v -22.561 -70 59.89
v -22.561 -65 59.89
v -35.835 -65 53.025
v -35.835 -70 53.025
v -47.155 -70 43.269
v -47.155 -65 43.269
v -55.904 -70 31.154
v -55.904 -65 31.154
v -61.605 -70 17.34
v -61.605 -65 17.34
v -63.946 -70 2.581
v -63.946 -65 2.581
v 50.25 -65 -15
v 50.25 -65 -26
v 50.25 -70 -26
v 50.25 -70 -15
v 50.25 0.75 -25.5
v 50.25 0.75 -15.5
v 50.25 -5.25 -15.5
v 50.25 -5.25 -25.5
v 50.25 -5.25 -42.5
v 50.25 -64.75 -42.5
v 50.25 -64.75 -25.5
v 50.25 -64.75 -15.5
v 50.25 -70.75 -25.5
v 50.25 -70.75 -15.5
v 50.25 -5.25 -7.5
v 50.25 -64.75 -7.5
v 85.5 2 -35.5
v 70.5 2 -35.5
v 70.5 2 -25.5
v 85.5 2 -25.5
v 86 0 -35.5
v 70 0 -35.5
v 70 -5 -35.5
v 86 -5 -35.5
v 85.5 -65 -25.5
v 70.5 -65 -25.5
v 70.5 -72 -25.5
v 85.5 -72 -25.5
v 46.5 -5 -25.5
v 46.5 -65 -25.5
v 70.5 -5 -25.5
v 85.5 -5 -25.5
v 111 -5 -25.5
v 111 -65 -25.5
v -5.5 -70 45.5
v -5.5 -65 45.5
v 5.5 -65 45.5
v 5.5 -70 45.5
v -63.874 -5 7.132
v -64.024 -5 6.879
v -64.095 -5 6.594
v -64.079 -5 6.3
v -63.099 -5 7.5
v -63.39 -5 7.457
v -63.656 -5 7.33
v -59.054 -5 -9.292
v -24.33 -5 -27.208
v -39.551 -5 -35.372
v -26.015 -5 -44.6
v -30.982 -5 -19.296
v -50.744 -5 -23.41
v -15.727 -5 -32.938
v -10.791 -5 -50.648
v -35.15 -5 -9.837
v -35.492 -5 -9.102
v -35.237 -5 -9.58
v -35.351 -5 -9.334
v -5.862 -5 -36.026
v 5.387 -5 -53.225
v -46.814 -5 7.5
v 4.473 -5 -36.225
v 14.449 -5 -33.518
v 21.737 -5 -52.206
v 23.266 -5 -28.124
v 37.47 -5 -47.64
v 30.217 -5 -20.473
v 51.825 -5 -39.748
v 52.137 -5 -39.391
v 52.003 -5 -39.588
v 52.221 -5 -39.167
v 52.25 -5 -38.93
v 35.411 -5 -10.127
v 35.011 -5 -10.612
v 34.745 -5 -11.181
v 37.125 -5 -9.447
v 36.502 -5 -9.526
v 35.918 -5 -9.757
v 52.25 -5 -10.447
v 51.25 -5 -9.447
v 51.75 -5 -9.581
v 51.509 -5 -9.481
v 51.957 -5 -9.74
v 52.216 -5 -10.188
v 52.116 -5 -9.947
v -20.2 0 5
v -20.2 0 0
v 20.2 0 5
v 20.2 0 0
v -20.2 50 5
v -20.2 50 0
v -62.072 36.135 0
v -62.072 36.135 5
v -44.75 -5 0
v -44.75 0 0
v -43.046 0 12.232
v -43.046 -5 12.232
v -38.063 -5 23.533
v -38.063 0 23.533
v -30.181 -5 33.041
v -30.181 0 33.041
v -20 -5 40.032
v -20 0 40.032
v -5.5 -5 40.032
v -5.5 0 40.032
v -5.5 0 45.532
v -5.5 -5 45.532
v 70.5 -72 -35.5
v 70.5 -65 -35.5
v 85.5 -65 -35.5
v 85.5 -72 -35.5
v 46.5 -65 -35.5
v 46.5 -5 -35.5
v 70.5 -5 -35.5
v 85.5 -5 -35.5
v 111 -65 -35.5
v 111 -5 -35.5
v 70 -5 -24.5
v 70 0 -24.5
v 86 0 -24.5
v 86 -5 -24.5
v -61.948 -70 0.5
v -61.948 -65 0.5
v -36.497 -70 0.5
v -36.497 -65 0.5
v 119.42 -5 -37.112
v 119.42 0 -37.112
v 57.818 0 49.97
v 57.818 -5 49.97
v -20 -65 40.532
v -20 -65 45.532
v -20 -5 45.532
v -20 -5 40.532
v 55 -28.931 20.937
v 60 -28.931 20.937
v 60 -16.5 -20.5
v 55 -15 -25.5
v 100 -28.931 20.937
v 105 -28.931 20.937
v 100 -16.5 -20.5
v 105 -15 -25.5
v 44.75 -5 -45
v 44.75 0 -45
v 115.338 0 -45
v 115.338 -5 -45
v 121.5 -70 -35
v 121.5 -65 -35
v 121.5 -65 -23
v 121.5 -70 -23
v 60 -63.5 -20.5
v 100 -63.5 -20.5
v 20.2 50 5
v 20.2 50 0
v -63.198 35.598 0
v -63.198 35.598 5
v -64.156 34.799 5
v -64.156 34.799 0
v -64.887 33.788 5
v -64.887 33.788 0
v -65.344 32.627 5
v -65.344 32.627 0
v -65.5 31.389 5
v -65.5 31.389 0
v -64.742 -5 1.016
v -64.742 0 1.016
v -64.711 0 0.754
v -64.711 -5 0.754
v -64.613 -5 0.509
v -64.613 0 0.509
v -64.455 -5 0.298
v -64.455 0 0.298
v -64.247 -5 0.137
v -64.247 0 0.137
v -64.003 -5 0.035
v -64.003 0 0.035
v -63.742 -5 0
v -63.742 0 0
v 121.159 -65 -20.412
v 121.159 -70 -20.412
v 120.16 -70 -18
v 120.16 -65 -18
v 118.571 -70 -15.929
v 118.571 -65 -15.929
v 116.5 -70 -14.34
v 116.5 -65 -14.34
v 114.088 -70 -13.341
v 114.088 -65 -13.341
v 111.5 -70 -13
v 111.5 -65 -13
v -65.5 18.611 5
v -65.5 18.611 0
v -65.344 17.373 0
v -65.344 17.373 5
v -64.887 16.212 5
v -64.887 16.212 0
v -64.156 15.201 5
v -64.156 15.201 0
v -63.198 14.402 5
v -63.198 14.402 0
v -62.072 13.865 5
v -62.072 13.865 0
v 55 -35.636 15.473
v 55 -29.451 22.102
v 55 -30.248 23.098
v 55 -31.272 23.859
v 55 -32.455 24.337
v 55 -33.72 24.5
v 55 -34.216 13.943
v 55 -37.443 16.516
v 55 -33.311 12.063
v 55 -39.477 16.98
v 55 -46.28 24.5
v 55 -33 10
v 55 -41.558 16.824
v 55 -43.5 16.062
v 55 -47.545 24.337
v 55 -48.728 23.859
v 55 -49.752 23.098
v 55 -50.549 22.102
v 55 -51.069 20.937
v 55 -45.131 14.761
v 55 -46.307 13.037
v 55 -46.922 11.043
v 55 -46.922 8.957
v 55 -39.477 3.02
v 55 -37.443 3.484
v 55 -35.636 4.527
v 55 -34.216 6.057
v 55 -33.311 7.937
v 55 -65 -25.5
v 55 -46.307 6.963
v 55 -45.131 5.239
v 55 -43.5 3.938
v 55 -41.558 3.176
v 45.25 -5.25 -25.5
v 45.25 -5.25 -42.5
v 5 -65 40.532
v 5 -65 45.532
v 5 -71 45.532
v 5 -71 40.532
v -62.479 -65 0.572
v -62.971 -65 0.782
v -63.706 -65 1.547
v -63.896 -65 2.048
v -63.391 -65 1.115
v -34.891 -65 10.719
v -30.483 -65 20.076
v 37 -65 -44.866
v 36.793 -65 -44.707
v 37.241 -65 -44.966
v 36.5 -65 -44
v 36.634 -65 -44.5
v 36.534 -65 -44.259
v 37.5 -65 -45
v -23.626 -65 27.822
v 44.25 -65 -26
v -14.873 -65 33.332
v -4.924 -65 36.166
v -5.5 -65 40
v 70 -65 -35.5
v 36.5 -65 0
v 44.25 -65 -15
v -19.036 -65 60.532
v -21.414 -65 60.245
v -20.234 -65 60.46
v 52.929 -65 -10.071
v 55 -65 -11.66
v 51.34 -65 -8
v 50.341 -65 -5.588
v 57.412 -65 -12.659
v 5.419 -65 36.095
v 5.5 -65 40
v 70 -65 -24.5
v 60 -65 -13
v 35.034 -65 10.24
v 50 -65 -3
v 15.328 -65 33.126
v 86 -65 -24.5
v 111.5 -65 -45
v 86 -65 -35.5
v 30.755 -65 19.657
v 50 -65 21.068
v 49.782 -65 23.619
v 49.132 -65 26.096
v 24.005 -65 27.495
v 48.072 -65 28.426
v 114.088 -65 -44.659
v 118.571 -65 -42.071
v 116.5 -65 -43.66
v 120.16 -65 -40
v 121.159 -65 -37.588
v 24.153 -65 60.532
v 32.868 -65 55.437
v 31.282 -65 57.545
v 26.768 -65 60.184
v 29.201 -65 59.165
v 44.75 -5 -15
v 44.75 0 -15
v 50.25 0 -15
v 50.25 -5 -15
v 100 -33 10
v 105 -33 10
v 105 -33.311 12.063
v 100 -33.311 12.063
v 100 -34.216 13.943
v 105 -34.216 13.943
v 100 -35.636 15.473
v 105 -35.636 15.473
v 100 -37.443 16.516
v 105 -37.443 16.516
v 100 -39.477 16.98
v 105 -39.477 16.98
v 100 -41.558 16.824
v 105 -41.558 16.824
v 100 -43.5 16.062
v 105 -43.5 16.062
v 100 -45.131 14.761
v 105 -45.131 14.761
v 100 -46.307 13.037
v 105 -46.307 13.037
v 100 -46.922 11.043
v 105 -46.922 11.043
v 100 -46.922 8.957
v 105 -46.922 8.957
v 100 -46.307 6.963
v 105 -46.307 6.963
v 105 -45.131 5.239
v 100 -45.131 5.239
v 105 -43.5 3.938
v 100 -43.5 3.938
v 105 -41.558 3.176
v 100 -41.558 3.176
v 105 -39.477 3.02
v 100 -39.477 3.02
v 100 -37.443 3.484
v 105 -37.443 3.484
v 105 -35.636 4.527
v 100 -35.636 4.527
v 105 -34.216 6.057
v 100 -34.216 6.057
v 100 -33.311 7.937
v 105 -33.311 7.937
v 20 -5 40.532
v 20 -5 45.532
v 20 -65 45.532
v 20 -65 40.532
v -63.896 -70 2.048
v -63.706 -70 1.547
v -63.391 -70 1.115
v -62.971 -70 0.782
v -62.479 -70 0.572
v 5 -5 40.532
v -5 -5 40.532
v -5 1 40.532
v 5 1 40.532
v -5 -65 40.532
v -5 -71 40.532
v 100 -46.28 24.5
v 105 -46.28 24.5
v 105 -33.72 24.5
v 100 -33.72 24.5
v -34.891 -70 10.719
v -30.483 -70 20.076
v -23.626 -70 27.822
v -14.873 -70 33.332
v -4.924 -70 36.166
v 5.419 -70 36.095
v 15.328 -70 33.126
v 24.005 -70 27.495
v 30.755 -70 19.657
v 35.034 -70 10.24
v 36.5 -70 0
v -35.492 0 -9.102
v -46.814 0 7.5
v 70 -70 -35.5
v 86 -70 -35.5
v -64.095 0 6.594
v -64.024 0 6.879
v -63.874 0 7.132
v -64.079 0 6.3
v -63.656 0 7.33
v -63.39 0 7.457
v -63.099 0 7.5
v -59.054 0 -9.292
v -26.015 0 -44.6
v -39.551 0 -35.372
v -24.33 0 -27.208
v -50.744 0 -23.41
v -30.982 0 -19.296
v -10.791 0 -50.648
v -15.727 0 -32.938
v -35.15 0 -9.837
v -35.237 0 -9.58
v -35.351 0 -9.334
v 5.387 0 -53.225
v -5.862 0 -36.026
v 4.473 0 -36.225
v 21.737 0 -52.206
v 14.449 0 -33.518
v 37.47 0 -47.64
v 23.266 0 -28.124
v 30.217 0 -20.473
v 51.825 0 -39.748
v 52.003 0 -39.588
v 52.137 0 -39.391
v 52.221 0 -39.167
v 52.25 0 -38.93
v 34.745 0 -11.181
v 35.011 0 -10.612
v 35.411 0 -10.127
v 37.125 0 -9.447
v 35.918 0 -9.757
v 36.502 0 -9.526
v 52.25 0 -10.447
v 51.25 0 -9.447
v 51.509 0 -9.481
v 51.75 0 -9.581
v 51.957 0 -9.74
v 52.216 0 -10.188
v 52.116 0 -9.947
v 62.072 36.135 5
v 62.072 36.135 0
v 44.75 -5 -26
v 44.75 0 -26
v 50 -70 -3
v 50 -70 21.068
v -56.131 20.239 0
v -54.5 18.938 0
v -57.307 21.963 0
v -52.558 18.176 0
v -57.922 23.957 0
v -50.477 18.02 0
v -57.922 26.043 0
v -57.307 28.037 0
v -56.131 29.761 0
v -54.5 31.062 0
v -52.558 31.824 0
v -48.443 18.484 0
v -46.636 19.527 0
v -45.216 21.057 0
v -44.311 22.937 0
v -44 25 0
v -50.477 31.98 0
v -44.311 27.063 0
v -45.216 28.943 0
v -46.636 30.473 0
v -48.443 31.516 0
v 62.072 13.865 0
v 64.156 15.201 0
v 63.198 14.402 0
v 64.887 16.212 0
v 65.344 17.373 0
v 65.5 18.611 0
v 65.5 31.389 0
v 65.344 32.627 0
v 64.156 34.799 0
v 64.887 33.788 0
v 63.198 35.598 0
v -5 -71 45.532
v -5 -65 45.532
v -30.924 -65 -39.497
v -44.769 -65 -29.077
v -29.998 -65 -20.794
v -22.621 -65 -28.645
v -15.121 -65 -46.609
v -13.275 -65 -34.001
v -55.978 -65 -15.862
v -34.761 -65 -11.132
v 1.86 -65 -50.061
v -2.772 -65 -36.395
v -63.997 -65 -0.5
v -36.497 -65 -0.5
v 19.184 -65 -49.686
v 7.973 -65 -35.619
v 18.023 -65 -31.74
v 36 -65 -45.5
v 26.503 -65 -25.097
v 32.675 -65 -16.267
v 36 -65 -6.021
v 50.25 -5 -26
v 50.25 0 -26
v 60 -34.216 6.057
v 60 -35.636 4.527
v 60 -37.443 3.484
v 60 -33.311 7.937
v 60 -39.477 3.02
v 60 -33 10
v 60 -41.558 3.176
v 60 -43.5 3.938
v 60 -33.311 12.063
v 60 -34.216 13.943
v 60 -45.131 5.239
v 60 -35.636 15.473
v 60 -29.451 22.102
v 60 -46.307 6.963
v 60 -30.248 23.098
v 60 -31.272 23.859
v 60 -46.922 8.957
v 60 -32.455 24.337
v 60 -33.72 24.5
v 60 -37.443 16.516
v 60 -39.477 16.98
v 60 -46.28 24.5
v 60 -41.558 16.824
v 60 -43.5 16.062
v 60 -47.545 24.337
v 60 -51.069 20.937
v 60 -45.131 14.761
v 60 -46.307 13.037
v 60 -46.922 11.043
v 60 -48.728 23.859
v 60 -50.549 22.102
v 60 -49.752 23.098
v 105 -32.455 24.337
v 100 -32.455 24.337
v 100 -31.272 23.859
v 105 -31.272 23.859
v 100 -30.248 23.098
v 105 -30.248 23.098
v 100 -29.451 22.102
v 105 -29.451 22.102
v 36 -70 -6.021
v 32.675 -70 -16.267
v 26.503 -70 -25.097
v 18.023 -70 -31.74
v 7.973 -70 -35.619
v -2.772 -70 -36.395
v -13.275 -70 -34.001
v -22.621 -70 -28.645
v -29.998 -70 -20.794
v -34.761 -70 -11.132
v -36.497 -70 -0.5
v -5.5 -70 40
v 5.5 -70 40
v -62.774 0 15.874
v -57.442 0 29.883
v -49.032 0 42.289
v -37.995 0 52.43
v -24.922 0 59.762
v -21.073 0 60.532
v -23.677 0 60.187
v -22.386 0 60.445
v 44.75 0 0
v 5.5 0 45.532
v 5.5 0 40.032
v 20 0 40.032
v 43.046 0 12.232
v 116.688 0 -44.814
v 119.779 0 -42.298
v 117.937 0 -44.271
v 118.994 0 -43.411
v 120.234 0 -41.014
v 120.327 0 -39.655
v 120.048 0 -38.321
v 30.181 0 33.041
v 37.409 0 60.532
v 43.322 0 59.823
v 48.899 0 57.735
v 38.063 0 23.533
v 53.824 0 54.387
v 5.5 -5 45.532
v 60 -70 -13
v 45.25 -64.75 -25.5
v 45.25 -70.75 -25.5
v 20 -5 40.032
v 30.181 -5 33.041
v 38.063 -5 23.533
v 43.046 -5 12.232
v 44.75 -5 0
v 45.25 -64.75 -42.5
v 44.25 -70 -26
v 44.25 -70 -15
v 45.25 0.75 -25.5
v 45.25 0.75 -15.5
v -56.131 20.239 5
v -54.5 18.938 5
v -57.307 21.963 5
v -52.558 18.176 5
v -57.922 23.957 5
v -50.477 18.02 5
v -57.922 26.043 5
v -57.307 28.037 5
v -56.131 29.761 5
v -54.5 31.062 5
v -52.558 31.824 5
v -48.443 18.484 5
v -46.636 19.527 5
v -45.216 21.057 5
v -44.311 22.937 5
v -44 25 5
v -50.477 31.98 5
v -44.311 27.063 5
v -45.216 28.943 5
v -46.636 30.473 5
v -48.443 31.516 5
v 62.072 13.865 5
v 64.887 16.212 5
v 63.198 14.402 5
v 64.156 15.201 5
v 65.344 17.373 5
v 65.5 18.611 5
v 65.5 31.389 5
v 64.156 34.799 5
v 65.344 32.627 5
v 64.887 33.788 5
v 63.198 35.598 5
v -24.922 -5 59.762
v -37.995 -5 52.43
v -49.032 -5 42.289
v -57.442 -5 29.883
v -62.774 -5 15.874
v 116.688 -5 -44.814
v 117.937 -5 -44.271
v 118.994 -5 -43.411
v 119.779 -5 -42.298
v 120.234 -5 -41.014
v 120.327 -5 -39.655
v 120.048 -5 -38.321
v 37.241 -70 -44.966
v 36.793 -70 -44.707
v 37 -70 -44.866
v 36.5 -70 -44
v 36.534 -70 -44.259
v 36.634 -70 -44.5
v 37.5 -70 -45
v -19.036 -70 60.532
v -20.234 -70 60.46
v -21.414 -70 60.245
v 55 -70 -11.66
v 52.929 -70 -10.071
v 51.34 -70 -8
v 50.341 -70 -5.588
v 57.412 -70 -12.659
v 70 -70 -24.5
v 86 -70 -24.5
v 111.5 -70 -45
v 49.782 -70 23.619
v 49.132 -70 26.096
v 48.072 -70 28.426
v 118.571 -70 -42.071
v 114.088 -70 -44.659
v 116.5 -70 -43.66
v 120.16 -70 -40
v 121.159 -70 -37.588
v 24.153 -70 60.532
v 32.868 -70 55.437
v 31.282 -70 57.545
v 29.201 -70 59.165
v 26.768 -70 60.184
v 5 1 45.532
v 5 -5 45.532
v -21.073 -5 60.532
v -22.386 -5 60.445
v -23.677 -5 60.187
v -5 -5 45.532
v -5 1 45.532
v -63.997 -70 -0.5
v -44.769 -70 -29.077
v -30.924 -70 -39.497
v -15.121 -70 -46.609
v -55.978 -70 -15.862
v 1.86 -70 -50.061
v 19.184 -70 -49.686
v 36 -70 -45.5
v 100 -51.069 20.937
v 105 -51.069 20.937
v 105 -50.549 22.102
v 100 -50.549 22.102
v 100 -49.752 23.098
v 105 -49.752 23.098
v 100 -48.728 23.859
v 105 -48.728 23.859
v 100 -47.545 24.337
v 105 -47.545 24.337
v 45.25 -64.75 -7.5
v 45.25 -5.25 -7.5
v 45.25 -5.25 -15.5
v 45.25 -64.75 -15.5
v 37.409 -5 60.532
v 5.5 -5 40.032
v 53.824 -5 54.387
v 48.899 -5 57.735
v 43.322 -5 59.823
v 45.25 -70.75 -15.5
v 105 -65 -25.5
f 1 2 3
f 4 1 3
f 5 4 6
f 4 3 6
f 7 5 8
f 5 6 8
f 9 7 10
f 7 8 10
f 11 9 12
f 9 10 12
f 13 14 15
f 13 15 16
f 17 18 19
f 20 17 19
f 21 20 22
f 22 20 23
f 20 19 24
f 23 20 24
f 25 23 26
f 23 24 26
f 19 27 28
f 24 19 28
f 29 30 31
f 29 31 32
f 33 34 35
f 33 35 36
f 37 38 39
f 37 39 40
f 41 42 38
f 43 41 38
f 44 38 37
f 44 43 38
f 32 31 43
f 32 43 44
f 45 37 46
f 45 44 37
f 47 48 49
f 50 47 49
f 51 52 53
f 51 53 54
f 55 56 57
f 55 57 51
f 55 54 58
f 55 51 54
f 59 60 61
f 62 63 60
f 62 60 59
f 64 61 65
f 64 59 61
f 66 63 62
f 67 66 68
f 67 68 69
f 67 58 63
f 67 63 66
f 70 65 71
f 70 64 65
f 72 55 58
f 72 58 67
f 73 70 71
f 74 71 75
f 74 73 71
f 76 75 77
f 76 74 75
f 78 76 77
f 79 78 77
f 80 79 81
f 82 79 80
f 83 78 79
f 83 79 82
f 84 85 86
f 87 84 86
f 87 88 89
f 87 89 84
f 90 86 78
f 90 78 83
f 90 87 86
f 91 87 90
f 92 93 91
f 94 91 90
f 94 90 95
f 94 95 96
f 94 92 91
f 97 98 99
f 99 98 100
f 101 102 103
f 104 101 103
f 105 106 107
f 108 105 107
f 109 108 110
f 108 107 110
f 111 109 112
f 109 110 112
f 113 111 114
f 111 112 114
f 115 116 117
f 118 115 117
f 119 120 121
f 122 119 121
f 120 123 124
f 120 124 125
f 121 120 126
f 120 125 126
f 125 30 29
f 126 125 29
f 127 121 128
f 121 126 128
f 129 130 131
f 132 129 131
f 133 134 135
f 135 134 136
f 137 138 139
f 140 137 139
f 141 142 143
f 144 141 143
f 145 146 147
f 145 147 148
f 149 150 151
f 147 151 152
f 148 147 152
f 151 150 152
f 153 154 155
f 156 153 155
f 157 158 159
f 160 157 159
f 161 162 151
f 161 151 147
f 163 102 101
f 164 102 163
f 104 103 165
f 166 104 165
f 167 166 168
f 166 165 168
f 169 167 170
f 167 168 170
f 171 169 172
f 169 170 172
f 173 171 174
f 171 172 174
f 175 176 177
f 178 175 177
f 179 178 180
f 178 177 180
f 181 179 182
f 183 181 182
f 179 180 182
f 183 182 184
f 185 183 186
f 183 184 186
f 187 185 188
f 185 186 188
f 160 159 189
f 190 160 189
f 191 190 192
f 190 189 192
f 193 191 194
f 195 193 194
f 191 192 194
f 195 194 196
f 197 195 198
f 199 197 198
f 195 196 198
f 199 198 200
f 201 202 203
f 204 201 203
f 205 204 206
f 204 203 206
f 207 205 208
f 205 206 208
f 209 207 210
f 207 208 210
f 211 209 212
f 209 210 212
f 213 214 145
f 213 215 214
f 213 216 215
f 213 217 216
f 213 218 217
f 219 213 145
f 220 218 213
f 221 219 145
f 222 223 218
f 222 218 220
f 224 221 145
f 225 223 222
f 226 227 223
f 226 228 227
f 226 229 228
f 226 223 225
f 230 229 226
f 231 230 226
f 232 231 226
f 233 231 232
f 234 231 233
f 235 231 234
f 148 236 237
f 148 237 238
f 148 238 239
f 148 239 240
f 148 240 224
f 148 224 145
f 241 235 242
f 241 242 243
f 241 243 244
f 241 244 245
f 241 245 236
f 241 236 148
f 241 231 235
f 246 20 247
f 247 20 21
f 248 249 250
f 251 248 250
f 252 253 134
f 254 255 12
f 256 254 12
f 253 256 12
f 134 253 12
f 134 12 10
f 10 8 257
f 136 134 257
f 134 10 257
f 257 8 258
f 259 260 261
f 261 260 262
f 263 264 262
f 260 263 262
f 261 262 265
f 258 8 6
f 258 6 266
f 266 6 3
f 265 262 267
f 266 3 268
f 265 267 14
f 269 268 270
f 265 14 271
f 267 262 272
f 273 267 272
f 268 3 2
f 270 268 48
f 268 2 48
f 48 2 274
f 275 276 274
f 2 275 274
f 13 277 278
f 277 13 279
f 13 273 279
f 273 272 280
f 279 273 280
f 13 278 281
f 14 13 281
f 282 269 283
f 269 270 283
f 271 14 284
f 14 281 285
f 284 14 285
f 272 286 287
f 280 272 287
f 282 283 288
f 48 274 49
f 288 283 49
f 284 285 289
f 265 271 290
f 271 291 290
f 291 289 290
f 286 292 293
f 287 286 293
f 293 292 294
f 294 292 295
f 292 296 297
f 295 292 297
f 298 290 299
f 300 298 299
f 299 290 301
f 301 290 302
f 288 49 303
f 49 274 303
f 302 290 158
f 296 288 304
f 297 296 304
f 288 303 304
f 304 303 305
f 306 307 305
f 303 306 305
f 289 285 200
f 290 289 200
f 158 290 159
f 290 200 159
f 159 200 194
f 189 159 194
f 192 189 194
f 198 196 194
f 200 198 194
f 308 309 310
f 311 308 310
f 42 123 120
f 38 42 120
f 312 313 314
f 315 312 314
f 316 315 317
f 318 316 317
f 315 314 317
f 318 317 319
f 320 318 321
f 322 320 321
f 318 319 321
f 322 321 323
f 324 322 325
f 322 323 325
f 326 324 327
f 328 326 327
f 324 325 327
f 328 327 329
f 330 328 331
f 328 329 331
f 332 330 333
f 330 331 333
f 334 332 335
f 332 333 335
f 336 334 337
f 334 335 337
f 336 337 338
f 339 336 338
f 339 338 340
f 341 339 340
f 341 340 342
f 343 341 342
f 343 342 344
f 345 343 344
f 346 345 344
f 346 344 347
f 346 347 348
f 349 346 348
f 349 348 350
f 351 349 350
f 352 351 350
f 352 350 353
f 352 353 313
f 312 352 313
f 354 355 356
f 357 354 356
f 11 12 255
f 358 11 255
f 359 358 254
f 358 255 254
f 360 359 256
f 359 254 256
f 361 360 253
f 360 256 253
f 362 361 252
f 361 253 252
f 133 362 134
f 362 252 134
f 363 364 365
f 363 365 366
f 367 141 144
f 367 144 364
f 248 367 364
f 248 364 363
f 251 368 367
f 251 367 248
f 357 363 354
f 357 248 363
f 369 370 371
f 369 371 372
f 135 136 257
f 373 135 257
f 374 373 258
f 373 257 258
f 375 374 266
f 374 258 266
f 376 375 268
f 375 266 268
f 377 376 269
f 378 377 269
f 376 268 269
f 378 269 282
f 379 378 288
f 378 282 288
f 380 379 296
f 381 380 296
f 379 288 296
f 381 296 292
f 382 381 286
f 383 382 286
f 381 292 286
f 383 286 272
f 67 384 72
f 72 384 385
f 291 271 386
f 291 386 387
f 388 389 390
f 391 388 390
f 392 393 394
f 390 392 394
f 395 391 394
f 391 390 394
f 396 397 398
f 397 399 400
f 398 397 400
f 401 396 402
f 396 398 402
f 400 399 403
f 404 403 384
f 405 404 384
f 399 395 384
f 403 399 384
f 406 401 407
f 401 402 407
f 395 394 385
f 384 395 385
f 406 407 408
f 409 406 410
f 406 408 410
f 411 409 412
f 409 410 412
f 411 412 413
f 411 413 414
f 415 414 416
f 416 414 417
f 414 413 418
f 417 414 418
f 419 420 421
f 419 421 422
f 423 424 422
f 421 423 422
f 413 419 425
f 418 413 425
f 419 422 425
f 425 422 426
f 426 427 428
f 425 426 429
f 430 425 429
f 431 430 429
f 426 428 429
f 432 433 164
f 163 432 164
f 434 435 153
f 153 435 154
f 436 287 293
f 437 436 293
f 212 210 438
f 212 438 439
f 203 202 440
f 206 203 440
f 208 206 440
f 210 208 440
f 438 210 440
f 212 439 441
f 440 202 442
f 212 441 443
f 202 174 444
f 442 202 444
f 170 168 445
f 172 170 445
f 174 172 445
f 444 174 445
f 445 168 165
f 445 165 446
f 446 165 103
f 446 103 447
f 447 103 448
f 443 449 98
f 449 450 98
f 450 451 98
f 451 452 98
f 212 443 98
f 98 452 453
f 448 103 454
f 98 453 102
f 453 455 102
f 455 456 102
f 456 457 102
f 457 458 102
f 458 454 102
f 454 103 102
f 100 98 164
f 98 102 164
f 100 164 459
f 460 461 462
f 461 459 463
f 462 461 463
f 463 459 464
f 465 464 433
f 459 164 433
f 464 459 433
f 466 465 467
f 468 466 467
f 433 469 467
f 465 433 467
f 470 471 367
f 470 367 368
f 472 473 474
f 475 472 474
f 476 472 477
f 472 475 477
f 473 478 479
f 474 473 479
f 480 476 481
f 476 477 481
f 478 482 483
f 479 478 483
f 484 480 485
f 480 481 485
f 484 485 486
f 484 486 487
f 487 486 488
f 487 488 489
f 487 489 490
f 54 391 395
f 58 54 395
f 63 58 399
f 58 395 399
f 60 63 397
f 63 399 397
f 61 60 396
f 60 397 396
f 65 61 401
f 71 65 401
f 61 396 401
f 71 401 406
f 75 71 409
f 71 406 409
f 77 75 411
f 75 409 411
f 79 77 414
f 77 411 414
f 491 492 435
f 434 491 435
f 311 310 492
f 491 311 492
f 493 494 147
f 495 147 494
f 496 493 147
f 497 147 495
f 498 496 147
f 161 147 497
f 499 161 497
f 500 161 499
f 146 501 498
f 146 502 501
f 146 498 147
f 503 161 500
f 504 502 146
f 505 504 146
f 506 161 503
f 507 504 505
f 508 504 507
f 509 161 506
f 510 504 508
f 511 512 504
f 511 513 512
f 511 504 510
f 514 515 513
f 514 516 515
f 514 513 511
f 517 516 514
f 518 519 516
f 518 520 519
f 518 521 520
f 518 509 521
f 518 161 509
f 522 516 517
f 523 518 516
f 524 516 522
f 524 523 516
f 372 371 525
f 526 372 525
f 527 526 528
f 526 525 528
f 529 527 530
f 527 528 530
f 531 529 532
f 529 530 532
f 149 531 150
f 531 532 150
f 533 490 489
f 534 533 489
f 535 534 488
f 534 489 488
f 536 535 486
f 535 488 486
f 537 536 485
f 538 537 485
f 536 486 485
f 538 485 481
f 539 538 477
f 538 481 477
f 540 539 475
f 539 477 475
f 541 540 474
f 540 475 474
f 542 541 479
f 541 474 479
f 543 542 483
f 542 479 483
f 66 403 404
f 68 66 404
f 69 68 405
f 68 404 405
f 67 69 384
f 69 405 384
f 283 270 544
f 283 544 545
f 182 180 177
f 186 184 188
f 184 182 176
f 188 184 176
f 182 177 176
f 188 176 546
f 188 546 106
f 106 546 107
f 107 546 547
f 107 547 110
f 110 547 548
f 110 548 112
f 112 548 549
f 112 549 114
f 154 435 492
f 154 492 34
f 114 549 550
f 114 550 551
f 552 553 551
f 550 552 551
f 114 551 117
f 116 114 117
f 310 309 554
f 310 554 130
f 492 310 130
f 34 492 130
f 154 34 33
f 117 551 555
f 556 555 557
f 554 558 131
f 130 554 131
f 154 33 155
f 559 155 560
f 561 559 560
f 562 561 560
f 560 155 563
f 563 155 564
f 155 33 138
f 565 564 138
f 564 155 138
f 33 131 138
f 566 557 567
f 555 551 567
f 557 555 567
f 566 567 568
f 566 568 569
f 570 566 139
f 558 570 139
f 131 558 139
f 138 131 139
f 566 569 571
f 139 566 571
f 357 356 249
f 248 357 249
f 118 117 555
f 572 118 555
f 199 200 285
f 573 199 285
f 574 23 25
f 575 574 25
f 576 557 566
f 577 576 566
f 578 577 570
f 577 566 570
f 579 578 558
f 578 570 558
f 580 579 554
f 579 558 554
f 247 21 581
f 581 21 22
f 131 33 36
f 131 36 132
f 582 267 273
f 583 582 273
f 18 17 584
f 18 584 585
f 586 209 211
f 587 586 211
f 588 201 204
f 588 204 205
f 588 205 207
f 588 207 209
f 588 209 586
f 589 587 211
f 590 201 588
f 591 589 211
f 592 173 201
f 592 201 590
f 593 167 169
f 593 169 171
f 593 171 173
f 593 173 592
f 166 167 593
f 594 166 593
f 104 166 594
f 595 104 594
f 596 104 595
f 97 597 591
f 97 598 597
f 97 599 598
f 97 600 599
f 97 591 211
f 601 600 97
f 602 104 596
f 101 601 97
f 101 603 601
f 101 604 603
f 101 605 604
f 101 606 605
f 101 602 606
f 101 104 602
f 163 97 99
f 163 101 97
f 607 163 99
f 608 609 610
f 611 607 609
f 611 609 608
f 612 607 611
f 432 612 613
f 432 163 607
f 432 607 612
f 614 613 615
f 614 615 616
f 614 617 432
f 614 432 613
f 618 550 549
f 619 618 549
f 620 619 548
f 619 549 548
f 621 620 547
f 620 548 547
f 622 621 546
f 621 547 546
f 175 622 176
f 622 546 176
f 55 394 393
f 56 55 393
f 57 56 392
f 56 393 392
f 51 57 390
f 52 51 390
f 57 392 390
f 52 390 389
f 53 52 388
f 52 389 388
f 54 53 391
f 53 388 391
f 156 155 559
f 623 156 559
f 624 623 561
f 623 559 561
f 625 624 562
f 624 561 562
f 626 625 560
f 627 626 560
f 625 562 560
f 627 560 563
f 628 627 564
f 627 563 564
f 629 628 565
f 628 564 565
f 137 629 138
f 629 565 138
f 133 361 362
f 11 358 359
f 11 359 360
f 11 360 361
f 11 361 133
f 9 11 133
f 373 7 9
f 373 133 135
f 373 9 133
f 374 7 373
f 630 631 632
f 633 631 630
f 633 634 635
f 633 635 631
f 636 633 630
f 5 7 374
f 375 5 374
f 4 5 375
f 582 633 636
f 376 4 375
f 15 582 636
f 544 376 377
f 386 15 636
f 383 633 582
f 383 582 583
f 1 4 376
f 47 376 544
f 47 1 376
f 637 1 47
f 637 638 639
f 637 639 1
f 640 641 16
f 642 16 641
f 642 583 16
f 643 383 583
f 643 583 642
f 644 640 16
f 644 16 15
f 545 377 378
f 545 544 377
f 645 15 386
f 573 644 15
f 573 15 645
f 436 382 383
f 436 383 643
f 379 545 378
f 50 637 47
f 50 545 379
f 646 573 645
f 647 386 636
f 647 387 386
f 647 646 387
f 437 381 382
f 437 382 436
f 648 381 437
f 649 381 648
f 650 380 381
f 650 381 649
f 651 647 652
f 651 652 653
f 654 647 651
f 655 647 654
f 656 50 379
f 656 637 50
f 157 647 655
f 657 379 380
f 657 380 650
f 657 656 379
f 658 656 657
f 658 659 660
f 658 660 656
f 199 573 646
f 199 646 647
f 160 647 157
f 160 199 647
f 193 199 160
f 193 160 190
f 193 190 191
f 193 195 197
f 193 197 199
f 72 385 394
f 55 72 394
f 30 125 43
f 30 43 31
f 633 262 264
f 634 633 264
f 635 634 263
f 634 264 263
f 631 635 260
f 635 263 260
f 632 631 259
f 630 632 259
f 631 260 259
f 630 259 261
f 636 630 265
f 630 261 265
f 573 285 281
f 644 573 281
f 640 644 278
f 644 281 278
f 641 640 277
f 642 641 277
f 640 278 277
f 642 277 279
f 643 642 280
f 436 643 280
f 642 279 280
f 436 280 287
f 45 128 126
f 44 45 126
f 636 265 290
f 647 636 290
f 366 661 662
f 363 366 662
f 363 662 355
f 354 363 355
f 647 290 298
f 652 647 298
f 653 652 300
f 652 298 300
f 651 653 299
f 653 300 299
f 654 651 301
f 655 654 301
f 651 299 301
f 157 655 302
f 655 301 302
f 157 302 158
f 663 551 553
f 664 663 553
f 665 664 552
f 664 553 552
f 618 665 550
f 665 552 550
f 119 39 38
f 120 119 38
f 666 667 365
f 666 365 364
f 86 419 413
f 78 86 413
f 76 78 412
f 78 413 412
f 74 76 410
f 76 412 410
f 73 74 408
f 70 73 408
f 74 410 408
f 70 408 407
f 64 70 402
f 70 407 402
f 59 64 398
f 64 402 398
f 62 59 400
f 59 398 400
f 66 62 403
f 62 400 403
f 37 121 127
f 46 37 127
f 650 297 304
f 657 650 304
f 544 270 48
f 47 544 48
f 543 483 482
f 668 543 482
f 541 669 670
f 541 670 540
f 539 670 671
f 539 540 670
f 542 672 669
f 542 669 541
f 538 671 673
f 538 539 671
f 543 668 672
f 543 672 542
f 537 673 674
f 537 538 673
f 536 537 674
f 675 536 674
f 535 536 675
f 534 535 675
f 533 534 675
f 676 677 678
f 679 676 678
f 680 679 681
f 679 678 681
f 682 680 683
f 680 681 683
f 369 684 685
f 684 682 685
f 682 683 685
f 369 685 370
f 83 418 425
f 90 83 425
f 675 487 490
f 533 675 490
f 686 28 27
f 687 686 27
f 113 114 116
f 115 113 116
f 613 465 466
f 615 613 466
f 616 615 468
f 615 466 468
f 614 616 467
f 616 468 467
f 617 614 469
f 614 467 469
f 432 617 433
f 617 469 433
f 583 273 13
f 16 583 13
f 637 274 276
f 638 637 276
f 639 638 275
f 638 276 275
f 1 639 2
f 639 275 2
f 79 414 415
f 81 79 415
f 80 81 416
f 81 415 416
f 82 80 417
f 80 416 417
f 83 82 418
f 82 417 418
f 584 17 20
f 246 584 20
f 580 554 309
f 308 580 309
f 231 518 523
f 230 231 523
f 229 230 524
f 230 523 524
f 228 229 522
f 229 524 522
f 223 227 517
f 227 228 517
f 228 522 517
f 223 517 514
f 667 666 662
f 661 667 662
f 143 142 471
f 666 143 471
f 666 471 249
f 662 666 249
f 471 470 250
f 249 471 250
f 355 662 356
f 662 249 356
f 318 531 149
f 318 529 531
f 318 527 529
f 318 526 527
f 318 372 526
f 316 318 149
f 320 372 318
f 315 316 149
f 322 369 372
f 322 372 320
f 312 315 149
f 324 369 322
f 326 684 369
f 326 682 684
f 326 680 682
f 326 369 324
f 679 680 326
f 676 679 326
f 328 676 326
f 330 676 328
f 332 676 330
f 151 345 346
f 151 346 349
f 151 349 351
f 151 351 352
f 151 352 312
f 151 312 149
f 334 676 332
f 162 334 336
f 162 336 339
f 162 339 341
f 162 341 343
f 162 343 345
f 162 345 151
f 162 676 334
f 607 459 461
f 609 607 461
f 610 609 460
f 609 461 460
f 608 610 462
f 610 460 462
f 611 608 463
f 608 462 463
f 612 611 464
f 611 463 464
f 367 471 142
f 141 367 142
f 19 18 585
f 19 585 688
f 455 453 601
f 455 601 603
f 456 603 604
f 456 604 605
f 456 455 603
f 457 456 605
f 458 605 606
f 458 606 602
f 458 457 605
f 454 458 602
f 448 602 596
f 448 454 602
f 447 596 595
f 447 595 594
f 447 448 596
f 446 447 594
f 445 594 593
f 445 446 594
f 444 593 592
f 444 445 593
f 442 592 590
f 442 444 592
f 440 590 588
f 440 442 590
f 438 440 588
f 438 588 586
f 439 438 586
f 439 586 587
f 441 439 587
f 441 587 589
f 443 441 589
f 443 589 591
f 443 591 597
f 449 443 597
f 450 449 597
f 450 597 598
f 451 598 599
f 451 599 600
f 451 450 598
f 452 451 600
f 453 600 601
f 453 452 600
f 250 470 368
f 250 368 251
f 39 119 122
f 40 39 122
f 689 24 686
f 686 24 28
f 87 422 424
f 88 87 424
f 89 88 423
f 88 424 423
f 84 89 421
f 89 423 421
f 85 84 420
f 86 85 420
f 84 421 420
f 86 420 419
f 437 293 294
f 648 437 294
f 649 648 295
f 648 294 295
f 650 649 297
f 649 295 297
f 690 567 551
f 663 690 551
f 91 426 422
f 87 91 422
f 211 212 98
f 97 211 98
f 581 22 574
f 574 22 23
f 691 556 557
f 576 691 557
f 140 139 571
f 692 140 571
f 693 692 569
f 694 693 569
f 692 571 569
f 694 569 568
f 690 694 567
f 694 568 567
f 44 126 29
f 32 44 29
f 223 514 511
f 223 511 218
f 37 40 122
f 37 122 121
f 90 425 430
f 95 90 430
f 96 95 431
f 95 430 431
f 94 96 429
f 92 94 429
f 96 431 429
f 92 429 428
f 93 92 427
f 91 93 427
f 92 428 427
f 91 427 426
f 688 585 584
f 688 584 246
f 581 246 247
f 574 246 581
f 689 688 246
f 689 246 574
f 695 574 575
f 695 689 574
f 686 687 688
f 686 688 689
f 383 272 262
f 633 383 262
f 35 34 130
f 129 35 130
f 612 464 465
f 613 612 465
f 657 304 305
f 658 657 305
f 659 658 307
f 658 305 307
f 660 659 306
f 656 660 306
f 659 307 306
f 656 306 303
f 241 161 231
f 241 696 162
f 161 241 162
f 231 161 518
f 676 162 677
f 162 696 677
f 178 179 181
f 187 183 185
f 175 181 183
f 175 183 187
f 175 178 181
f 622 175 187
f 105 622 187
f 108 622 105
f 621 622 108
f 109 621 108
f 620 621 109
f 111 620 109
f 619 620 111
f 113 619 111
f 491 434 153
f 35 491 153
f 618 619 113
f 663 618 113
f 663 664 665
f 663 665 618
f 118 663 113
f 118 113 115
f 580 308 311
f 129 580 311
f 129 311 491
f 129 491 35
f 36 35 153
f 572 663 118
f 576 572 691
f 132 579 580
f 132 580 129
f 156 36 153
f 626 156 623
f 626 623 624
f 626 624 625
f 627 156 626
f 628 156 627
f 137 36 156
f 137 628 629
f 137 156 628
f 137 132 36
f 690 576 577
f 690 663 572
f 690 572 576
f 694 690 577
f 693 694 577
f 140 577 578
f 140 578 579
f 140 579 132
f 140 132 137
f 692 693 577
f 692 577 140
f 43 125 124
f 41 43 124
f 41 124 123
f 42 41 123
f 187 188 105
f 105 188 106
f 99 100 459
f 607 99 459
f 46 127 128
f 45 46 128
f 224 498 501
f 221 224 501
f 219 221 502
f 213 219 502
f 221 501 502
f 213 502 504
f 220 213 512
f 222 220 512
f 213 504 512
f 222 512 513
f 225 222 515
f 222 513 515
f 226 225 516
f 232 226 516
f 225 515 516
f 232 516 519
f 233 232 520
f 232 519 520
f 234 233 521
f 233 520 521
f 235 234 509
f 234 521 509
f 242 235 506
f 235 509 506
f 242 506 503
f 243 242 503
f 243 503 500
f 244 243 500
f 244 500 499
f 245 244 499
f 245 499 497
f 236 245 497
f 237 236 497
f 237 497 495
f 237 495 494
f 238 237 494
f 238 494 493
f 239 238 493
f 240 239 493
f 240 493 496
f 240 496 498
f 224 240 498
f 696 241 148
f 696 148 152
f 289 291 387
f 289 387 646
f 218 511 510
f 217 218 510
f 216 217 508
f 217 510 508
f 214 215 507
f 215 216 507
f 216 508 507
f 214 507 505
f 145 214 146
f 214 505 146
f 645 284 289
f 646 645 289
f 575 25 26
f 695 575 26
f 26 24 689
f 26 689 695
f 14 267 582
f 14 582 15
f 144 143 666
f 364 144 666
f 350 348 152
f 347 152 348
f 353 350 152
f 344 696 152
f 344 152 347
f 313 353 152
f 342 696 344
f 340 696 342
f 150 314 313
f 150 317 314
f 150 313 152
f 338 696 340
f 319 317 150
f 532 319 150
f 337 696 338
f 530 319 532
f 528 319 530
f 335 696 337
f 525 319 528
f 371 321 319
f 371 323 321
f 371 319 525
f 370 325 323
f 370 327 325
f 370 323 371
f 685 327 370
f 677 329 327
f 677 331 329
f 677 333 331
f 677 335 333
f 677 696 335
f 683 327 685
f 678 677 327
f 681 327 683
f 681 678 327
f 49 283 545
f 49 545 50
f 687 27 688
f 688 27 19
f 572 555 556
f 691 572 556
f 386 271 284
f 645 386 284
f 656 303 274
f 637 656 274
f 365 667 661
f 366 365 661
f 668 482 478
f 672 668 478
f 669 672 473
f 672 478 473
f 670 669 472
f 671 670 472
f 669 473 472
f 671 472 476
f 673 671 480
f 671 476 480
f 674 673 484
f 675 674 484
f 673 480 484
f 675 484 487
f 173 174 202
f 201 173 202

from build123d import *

# Parameters (mm, degrees)
F0_W      = 16
F0_H      = 11
F1_DEPTH  = 5
F3_DEPTH  = 5
F4_W      = 15
F4_H      = 7
F5_DEPTH  = 10
F7_DEPTH  = 50
F8_R      = 7
F9_DEPTH  = 602
F10_W     = 16
F10_H     = 11
F10_W_2   = 6
F10_W_3   = 11
F10_H_2   = 5.5
F11_DEPTH = 5
F12_W     = 10
F12_H     = 6
F13_DEPTH = 5
F14_W     = 6
F14_H     = 10
F15_DEPTH = 5
F16_W     = 40.4
F16_H     = 50
F16_R     = 7
F17_DEPTH = 5


with BuildPart() as f1:
    # F0 (on Front) → F1 (new body)
    with BuildSketch(Plane.XZ):
        with BuildLine():
            ThreePointArc((-44.75, 0), (-38.0628591937, 23.5325572346), (-20, 40.0320184352))
            Line((-20, 40.0320184352), (-5.5, 40.0320184352))
            Line((-5.5, 40.0320184352), (-5.5, 45.5320184352))
            Line((-5.5, 45.5320184352), (5.5, 45.5320184352))
            Line((5.5, 45.5320184352), (5.5, 40.0320184352))
            Line((5.5, 40.0320184352), (20, 40.0320184352))
            ThreePointArc((20, 40.0320184352), (38.0628591937, 23.5325572346), (44.75, 0))
            Line((44.75, 0), (44.75, -15))
            Line((44.75, -15), (50.25, -15))
            Line((50.25, -15), (50.25, -26))
            Line((50.25, -26), (44.75, -26))
            Line((44.75, -26), (44.75, -45))
            Line((44.75, -45), (115.3384250636, -45))
            ThreePointArc((115.3384250636, -45), (119.7790192257, -42.2980695132), (119.4203426893, -37.1124493949))
            Line((119.4203426893, -37.1124493949), (57.8183353545, 49.9697714605))
            ThreePointArc((57.8183353545, 49.9697714605), (48.8990947917, 57.7349892458), (37.4087472259, 60.5320184352))
            Line((37.4087472259, 60.5320184352), (-21.0731490969, 60.5320184352))
            ThreePointArc((-21.0731490969, 60.5320184352), (-23.0358100352, 60.3375251555), (-24.9221261009, 59.7616108435))
            ThreePointArc((-24.9221261009, 59.7616108435), (-53.5974466329, 36.3301006665), (-64.742033343, 1.0156862745))
            ThreePointArc((-64.742033343, 1.0156862745), (-64.4547875171, 0.2984610754), (-63.7421563802, 0))
            Line((-63.7421563802, 0), (-44.75, 0))
        make_face()
        with Locations((78, -30)):
            Rectangle(F0_W, F0_H, mode=Mode.SUBTRACT)
    extrude(amount=F1_DEPTH)


with BuildPart() as f3:
    # F2 (on Front) → F3 (new body)
    with BuildSketch(Plane.XZ):
        with BuildLine():
            ThreePointArc((34.7452688352, -11.1810685343), (-0.7019415454, -36.4932497603), (-35.1495411988, -9.8366535729))
            ThreePointArc((-35.1495411988, -9.8366535729), (-35.2906163676, -9.4552639466), (-35.4916558634, -9.10179065))
            Line((-35.4916558634, -9.10179065), (-46.8141702893, 7.5))
            Line((-46.8141702893, 7.5), (-63.0992528337, 7.5))
            ThreePointArc((-63.0992528337, 7.5), (-63.8739545458, 7.1323268596), (-64.0789822352, 6.2996745148))
            ThreePointArc((-64.0789822352, 6.2996745148), (-18.5697408757, -48.0433417775), (51.8251365248, -39.7478186089))
            ThreePointArc((51.8251365248, -39.7478186089), (52.1374504281, -39.3906643432), (52.25, -38.9297611673))
            Line((52.25, -38.9297611673), (52.25, -10.4468951462))
            ThreePointArc((52.25, -10.4468951462), (51.9571067812, -9.7397883651), (51.25, -9.4468951462))
            Line((51.25, -9.4468951462), (37.1250817691, -9.4468951462))
            ThreePointArc((37.1250817691, -9.4468951462), (35.6527649774, -9.9264290453), (34.7452688352, -11.1810685343))
        make_face()
    extrude(amount=F3_DEPTH)


with BuildPart() as f5:
    # F4 (on face) → F5 (new body)
    with BuildSketch(Plane.XY.offset(-35.5)):
        Polygon((70.5, -5), (46.5, -5), (46.5, -65), (70.5, -65), (85.5, -65), (111, -65), (111, -5), (85.5, -5), align=None)
        with Locations((78, -1.5)):
            Rectangle(F4_W, F4_H)
        with Locations((78, -68.5)):
            Rectangle(F4_W, F4_H)
    extrude(amount=F5_DEPTH)


with BuildPart() as f7:
    # F6 (on face) → F7 (new body)
    with BuildSketch(Plane.XZ.offset(65)):
        Polygon((60, -20.5), (60, 24.5), (55, 24.5), (55, -25.5), (105, -25.5), (105, 24.5), (100, 24.5), (100, -20.5), align=None)
    extrude(amount=-F7_DEPTH)

    # F8 (on face) → F9 (cut)
    with BuildSketch(Plane.YZ.offset(105)):
        with Locations((-40, 10)):
            Circle(F8_R)
        with BuildLine():
            Line((-15, 24.5), (-33.7201532545, 24.5))
            ThreePointArc((-33.7201532545, 24.5), (-30.7355006063, 23.5114646414), (-28.9310218283, 20.9367394278))
            Line((-28.9310218283, 20.9367394278), (-15, -25.5))
            Line((-15, -25.5), (-15, 24.5))
        make_face()
        with BuildLine():
            ThreePointArc((-51.0689781717, 20.9367394278), (-49.2644993937, 23.5114646414), (-46.2798467455, 24.5))
            Line((-46.2798467455, 24.5), (-65, 24.5))
            Line((-65, 24.5), (-65, -25.5))
            Line((-65, -25.5), (-51.0689781717, 20.9367394278))
        make_face()
    extrude(amount=-F9_DEPTH, mode=Mode.SUBTRACT)


with BuildPart() as f11:
    # F10 (on face) → F11 (new body)
    with BuildSketch(Plane.XZ.offset(65)):
        with BuildLine():
            ThreePointArc((-36.4965751818, 0.5), (0.2500058646, 36.4991437854), (36.5, 0))
            Line((36.5, 0), (36.5, -44))
            ThreePointArc((36.5, -44), (36.7928932188, -44.7071067812), (37.5, -45))
            Line((37.5, -45), (111.5, -45))
            ThreePointArc((111.5, -45), (118.5710678119, -42.0710678119), (121.5, -35))
            Line((121.5, -35), (121.5, -23))
            ThreePointArc((121.5, -23), (118.5710678119, -15.9289321881), (111.5, -13))
            Line((111.5, -13), (60, -13))
            ThreePointArc((60, -13), (52.9289321881, -10.0710678119), (50, -3))
            Line((50, -3), (50, 0.018009717))
            Line((50, 0.018009717), (50, 21.0684654677))
            ThreePointArc((50, 21.0684654677), (49.5098805968, 24.8715385761), (48.0715513243, 28.4260836948))
            Line((48.0715513243, 28.4260836948), (32.8677915898, 55.4370972533))
            ThreePointArc((32.8677915898, 55.4370972533), (29.2006614936, 59.1648276009), (24.1534240403, 60.5320184352))
            Line((24.1534240403, 60.5320184352), (-19.0356554977, 60.5320184352))
            ThreePointArc((-19.0356554977, 60.5320184352), (-20.8272522454, 60.3702185295), (-22.5608729561, 59.890054654))
            ThreePointArc((-22.5608729561, 59.890054654), (-51.8842214925, 37.4678421465), (-63.9464768042, 2.5806470755))
            ThreePointArc((-63.9464768042, 2.5806470755), (-63.3905482792, 1.1145928669), (-61.9481034534, 0.5))
            Line((-61.9481034534, 0.5), (-36.4965751818, 0.5))
        make_face()
        with Locations((78, -30)):
            Rectangle(F10_W, F10_H, mode=Mode.SUBTRACT)
        with Locations((47.25, -20.5)):
            Rectangle(F10_W_2, F10_H, mode=Mode.SUBTRACT)
        with Locations((0, 42.75)):
            Rectangle(F10_W_3, F10_H_2, mode=Mode.SUBTRACT)
    extrude(amount=F11_DEPTH)


with BuildPart() as f11b:
    # F10 (on face) → F11, piece 2 (new body)
    with BuildSketch(Plane.XZ.offset(65)):
        with BuildLine():
            ThreePointArc((36, -6.0207972894), (-2.7715424235, -36.394622578), (-36.4965751818, -0.5))
            Line((-36.4965751818, -0.5), (-63.9965751818, -0.5))
            ThreePointArc((-63.9965751818, -0.5), (-23.2202611112, -43.4925726322), (36, -45.5))
            Line((36, -45.5), (36, -6.0207972894))
        make_face()
    extrude(amount=F11_DEPTH)


with BuildPart() as f13:
    # F12 (on face) → F13 (new body)
    with BuildSketch(Plane(origin=(0, 0, 45.5320184352), x_dir=(1, 0, 0), z_dir=(0, 0, -1))):
        Polygon((-20, 65), (-20, 5), (-5, 5), (5, 5), (20, 5), (20, 65), (5, 65), (-5, 65), align=None)
        with Locations((0, 2)):
            Rectangle(F12_W, F12_H)
        with Locations((0, 68)):
            Rectangle(F12_W, F12_H)
    extrude(amount=F13_DEPTH)


with BuildPart() as f15:
    # F14 (on face) → F15 (new body)
    with BuildSketch(Plane(origin=(50.25, 0, 0), x_dir=(0, -1, 0), z_dir=(-1, 0, 0))):
        Polygon((64.75, -7.5), (5.25, -7.5), (5.25, -15.5), (5.25, -25.5), (5.25, -42.5), (64.75, -42.5), (64.75, -26), (64.75, -25.5), (64.75, -15.5), align=None)
        with Locations((2.25, -20.5)):
            Rectangle(F14_W, F14_H)
        with Locations((67.75, -20.5)):
            Rectangle(F14_W, F14_H)
    extrude(amount=F15_DEPTH)


with BuildPart() as f17:
    # F16 (on Top) → F17 (new body)
    with BuildSketch(Plane.XY):
        with Locations((0, 25)):
            Rectangle(F16_W, F16_H)
        with BuildLine():
            Line((-62.0717054726, 13.8648031366), (-20.2, 0))
            Line((-20.2, 0), (-20.2, 50))
            Line((-20.2, 50), (-62.0717054726, 36.1351968634))
            ThreePointArc((-62.0717054726, 36.1351968634), (-64.5533028115, 34.3162283279), (-65.5, 31.3886463362))
            Line((-65.5, 31.3886463362), (-65.5, 18.6113536638))
            ThreePointArc((-65.5, 18.6113536638), (-64.5533028115, 15.6837716721), (-62.0717054726, 13.8648031366))
        make_face()
        with Locations((-51, 25)):
            Circle(F16_R, mode=Mode.SUBTRACT)
        with BuildLine():
            Line((20.2, 50), (20.2, 0))
            Line((20.2, 0), (62.0717054726, 13.8648031366))
            ThreePointArc((62.0717054726, 13.8648031366), (64.5533028115, 15.6837716721), (65.5, 18.6113536638))
            Line((65.5, 18.6113536638), (65.5, 31.3886463362))
            ThreePointArc((65.5, 31.3886463362), (64.5533028115, 34.3162283279), (62.0717054726, 36.1351968634))
            Line((62.0717054726, 36.1351968634), (20.2, 50))
        make_face()
    extrude(amount=F17_DEPTH)


solid = Compound([f1.part, f3.part, f5.part, f7.part, f11.part, f11b.part, f13.part, f15.part, f17.part])
